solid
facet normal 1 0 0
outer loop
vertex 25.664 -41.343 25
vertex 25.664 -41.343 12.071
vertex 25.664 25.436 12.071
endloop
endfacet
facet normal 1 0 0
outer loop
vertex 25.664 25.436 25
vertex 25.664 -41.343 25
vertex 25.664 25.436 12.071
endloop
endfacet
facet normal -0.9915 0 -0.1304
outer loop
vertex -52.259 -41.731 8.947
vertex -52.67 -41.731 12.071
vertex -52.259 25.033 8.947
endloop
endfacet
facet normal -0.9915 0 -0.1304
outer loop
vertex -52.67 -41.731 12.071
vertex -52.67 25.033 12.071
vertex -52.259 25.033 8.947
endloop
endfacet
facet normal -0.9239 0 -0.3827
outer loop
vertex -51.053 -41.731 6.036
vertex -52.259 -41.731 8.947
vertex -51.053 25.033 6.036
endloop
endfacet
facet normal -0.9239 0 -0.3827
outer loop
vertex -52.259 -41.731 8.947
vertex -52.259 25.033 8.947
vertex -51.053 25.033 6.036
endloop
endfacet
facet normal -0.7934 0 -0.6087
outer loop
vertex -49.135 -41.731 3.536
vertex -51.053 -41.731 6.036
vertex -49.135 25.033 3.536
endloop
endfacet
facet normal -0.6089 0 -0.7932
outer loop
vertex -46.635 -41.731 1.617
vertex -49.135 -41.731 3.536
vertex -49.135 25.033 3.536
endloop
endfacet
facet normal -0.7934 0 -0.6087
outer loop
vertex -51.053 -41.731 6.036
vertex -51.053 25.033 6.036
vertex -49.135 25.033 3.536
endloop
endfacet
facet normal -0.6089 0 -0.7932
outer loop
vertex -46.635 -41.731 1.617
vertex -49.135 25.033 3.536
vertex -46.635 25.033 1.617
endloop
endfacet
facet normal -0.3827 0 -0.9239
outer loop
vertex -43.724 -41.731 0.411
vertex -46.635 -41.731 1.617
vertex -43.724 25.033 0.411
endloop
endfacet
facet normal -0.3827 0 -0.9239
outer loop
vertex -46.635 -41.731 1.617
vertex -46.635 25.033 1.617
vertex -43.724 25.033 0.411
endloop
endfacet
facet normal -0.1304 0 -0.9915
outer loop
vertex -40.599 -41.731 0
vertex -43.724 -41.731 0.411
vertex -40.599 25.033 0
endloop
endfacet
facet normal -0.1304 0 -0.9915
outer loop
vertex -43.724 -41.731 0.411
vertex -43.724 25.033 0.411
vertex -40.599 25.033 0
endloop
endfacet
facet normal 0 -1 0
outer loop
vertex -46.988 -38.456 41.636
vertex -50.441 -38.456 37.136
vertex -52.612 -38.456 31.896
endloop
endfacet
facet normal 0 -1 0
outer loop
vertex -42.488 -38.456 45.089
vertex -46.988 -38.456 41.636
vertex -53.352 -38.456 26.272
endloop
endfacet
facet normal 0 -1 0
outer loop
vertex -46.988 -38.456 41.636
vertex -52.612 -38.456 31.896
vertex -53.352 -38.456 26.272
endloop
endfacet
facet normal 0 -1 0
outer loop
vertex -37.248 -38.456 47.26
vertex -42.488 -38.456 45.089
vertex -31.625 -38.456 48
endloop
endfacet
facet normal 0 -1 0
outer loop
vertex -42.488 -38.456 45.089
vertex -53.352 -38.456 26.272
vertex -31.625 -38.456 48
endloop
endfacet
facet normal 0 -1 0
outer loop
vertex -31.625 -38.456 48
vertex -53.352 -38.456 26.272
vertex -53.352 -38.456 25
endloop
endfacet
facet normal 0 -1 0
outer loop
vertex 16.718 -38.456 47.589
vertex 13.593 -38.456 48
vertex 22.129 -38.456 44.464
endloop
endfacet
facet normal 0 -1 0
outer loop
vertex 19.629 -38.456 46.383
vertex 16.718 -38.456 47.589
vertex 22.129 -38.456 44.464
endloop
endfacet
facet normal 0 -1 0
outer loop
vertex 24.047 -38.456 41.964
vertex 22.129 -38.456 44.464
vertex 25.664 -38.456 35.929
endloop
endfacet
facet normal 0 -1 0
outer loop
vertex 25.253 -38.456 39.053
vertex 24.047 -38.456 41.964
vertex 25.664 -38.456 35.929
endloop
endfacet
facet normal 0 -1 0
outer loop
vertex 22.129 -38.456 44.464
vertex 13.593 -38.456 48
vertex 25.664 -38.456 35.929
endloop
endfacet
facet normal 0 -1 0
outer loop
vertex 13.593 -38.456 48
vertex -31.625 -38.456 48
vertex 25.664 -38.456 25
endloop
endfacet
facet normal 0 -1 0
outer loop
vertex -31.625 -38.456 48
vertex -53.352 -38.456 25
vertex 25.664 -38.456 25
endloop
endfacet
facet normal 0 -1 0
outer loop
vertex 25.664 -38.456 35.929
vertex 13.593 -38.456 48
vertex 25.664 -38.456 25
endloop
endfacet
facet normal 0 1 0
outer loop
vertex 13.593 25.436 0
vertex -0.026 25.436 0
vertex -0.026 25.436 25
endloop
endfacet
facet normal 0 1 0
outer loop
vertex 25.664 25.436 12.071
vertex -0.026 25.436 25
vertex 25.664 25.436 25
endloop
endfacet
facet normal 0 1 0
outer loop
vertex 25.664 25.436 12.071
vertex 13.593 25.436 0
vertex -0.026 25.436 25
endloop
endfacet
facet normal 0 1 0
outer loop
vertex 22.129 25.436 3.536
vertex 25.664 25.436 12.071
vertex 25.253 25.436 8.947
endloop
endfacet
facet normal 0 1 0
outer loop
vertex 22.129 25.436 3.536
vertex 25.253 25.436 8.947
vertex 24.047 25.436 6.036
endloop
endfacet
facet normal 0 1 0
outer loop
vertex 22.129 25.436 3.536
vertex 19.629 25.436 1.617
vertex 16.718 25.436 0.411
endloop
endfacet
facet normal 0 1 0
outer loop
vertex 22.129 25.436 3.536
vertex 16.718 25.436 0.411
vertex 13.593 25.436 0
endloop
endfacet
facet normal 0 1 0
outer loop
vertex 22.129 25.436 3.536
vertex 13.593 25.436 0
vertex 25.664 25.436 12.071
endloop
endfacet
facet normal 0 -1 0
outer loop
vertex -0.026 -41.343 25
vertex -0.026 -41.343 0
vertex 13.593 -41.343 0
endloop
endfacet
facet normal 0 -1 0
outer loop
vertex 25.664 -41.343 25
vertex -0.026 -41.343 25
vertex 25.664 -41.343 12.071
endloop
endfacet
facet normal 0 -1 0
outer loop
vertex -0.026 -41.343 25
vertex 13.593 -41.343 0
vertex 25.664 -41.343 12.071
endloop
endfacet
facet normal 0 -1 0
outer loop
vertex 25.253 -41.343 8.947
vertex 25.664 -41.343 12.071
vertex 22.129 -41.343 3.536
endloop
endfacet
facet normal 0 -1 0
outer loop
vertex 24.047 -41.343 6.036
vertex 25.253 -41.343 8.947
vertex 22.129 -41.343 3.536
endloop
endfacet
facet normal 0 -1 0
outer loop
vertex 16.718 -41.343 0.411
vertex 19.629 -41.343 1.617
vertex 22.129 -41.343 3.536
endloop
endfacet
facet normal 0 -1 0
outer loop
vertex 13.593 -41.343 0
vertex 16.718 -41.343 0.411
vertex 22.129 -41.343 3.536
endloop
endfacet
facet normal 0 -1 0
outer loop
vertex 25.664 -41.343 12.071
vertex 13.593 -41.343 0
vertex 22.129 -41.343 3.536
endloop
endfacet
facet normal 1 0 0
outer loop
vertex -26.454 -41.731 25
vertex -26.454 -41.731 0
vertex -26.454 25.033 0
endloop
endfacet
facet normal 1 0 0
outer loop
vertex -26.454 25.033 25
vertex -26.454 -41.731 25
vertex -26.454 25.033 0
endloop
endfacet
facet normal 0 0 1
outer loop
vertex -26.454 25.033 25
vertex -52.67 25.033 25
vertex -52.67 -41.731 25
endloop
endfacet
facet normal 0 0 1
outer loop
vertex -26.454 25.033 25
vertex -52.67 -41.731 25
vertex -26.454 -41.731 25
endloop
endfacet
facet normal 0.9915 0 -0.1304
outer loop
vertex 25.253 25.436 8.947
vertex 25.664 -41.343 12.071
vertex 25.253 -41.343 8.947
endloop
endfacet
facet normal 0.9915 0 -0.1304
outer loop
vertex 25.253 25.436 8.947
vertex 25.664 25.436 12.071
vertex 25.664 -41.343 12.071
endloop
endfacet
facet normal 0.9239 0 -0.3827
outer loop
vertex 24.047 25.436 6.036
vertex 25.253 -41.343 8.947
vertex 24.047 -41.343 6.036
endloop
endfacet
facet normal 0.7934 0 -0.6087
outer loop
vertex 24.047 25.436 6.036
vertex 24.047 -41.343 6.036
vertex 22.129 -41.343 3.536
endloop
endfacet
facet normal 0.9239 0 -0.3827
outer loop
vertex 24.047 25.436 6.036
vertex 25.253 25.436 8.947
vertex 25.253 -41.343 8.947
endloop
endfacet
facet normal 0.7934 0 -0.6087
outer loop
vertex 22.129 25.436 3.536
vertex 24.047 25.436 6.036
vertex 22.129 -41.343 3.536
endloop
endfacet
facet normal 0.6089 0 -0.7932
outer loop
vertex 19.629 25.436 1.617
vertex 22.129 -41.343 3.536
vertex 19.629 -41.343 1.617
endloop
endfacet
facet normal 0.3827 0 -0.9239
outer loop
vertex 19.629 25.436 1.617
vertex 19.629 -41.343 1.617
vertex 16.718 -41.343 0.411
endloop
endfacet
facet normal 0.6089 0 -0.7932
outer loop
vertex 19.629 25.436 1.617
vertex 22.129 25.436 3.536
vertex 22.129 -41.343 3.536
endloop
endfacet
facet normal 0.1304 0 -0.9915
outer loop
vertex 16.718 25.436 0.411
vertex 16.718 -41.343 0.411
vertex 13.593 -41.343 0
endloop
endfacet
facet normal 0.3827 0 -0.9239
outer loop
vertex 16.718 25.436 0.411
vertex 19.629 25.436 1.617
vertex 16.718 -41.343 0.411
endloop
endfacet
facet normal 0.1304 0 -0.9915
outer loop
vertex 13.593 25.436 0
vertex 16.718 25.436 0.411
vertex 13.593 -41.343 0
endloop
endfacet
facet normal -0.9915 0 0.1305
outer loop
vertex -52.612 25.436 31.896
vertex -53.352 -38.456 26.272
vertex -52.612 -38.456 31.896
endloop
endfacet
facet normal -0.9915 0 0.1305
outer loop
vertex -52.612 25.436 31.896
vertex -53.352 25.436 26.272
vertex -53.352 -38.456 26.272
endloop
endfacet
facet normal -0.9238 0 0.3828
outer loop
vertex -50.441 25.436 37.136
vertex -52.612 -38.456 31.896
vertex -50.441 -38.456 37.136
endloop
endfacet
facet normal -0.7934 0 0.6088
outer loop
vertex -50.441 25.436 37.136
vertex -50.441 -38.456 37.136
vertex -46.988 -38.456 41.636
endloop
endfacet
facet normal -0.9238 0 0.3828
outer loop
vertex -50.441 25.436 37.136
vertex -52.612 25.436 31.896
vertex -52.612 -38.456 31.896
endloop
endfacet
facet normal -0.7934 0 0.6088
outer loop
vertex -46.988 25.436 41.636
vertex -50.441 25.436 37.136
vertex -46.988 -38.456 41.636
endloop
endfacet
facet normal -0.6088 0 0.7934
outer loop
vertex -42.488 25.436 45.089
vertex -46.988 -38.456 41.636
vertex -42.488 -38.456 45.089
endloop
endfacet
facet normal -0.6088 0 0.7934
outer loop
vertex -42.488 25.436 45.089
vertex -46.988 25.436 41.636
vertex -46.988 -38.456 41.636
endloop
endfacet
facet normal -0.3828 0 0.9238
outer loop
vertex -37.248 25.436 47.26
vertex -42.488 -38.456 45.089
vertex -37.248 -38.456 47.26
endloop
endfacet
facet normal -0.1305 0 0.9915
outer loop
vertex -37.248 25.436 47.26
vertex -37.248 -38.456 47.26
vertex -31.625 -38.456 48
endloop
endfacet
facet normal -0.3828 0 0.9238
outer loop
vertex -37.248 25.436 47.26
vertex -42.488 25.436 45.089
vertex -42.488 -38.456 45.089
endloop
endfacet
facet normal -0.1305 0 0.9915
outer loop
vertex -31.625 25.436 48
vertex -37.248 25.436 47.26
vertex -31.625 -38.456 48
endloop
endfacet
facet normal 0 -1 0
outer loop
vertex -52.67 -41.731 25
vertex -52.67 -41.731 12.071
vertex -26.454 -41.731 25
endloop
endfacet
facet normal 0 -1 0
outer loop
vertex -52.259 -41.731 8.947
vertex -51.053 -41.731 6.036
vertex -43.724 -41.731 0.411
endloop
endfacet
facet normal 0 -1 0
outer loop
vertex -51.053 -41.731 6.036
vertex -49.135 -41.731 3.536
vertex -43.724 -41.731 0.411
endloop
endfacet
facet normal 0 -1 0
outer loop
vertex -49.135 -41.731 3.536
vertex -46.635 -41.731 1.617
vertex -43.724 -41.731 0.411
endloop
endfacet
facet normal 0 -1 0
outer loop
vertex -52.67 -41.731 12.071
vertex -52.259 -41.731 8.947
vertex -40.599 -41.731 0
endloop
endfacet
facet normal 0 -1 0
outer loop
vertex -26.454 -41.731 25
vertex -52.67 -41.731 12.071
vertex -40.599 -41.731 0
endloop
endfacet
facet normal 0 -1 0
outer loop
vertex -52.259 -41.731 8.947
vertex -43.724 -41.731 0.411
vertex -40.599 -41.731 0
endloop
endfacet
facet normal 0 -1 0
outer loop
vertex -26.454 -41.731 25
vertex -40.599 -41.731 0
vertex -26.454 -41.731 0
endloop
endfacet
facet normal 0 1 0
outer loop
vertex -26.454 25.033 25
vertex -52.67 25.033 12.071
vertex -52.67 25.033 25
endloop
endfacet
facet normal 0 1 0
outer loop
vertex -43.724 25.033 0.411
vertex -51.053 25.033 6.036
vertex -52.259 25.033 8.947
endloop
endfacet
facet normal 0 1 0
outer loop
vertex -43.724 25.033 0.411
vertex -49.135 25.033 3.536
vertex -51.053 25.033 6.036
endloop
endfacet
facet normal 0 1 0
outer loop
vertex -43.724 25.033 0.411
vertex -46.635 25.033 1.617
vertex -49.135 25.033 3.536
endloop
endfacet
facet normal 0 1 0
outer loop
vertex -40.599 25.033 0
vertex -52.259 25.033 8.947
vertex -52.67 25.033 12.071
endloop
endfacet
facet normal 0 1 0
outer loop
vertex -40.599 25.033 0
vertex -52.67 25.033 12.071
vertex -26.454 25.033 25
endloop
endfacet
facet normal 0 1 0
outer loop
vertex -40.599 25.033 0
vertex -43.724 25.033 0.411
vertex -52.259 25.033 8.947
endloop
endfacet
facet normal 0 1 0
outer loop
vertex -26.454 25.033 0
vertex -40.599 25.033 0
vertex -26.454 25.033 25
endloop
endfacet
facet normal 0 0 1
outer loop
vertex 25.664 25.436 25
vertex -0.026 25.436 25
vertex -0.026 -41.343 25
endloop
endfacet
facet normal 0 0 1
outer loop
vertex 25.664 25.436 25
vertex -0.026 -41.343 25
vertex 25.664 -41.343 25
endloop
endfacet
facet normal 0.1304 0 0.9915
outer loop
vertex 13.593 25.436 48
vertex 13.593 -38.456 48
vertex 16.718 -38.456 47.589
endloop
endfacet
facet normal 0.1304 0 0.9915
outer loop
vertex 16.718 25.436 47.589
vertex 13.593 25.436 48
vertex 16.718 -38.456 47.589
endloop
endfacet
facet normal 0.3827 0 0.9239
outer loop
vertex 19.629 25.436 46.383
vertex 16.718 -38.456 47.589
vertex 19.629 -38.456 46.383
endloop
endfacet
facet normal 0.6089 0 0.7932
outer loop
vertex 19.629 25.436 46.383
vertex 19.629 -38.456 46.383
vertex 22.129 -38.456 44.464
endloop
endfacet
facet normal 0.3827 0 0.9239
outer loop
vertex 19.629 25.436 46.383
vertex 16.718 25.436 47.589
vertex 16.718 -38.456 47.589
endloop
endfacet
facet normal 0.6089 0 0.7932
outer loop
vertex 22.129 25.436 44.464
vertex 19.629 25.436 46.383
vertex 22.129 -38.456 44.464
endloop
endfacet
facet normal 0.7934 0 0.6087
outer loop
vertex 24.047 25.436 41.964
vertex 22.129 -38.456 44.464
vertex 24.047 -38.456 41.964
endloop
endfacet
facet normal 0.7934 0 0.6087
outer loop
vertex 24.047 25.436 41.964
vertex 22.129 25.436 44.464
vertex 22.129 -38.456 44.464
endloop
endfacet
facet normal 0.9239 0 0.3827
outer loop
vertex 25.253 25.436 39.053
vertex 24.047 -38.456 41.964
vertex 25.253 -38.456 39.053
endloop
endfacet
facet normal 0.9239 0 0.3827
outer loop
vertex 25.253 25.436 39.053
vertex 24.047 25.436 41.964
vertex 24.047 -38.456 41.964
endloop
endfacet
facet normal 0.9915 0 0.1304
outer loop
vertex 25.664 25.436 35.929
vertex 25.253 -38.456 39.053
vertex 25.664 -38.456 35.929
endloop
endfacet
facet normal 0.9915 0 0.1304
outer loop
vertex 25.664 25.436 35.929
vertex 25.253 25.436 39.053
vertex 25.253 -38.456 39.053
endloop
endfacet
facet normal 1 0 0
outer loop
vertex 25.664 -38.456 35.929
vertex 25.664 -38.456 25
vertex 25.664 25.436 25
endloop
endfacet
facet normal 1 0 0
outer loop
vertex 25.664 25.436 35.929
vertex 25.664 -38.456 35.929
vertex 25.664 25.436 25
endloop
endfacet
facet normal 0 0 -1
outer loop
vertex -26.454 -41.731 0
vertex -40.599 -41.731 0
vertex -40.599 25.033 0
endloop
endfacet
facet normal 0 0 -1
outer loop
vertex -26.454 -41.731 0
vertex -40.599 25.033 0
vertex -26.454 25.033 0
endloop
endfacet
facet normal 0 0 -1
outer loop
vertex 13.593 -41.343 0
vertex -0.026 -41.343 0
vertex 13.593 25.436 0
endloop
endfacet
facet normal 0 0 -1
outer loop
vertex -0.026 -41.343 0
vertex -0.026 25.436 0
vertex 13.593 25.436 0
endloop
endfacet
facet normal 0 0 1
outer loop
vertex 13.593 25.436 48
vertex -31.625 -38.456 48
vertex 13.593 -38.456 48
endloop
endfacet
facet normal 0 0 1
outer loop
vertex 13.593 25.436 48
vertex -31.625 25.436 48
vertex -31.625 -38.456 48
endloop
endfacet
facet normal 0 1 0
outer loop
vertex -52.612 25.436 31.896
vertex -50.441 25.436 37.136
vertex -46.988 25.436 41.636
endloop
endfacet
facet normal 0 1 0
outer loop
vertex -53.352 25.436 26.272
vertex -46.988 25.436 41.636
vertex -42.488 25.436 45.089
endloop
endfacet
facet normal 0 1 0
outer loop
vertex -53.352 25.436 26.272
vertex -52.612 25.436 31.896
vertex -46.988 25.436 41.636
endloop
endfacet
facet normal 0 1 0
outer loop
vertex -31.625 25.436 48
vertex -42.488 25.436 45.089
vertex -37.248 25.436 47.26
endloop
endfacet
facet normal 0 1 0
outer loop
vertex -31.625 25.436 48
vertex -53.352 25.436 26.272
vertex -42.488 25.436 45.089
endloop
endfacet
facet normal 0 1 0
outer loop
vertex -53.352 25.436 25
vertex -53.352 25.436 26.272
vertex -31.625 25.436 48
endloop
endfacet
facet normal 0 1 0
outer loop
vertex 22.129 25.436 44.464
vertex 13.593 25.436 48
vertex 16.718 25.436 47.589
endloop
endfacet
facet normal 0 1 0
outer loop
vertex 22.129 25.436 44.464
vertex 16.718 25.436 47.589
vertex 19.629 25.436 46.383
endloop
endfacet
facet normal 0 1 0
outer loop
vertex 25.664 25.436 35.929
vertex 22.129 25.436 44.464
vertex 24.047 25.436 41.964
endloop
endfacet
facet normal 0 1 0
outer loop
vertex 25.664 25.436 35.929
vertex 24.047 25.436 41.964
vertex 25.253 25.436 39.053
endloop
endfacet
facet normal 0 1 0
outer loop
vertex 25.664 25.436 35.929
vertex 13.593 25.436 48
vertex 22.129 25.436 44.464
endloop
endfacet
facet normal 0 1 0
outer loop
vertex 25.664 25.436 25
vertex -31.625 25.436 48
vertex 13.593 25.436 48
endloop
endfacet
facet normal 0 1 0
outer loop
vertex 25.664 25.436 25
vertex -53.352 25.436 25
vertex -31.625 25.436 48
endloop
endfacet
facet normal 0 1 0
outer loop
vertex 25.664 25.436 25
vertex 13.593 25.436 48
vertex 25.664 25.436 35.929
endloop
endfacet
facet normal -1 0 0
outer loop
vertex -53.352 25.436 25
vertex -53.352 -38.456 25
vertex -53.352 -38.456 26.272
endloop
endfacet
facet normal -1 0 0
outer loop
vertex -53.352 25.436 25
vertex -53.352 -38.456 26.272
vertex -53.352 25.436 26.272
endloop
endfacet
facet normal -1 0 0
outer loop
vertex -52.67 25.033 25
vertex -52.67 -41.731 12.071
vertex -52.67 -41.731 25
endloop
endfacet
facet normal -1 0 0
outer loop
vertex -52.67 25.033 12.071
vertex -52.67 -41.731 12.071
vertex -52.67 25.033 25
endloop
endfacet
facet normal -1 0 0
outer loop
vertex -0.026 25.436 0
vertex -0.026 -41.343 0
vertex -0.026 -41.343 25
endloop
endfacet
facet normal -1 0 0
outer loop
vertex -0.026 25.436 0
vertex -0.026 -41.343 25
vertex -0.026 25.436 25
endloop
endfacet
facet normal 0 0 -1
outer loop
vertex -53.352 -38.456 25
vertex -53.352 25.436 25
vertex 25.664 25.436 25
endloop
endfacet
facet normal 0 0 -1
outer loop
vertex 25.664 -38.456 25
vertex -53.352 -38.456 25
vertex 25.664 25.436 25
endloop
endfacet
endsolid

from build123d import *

# Parameters (mm, degrees)
F0_W     = 26.215993
F0_H     = 66.764804
F0_W_2   = 25.690524
F0_H_2   = 66.778887
F1_DEPTH = 25
F2_W     = 79.016809
F2_H     = 63.892803
F3_DEPTH = 23
F4_R     = 21.727922
F5_R     = 12.071068
F5_2_R   = 12.071068


with BuildPart() as f1:
    # F0 (on Top) → F1 (new body)
    with BuildSketch(Plane.XY):
        with Locations((-39.562472, -8.34906)):
            Rectangle(F0_W, F0_H)
        with Locations((12.819124, -7.953069)):
            Rectangle(F0_W_2, F0_H_2)
    extrude(amount=F1_DEPTH)

    # F5#2
    f5_2_edges = [f1.edges().sort_by_distance(p)[0] for p in [
        (-52.670468, -8.34906, 0),
        (25.664386, -7.953069, 0),
    ]]
    fillet(f5_2_edges, radius=F5_2_R)


with BuildPart() as f3:
    # F2 (on face) → F3 (new body)
    with BuildSketch(Plane.XY.offset(25)):
        with Locations((-13.844018, -6.510028)):
            Rectangle(F2_W, F2_H)
    extrude(amount=F3_DEPTH)

    # F4
    f4_edges = [f3.edges().sort_by_distance(p)[0] for p in [
        (-53.352423, -6.510027, 48),
    ]]
    fillet(f4_edges, radius=F4_R)

    # F5
    f5_edges = [f3.edges().sort_by_distance(p)[0] for p in [
        (25.664386, -6.510027, 48),
    ]]
    fillet(f5_edges, radius=F5_R)


solid = Compound([f1.part, f3.part])
